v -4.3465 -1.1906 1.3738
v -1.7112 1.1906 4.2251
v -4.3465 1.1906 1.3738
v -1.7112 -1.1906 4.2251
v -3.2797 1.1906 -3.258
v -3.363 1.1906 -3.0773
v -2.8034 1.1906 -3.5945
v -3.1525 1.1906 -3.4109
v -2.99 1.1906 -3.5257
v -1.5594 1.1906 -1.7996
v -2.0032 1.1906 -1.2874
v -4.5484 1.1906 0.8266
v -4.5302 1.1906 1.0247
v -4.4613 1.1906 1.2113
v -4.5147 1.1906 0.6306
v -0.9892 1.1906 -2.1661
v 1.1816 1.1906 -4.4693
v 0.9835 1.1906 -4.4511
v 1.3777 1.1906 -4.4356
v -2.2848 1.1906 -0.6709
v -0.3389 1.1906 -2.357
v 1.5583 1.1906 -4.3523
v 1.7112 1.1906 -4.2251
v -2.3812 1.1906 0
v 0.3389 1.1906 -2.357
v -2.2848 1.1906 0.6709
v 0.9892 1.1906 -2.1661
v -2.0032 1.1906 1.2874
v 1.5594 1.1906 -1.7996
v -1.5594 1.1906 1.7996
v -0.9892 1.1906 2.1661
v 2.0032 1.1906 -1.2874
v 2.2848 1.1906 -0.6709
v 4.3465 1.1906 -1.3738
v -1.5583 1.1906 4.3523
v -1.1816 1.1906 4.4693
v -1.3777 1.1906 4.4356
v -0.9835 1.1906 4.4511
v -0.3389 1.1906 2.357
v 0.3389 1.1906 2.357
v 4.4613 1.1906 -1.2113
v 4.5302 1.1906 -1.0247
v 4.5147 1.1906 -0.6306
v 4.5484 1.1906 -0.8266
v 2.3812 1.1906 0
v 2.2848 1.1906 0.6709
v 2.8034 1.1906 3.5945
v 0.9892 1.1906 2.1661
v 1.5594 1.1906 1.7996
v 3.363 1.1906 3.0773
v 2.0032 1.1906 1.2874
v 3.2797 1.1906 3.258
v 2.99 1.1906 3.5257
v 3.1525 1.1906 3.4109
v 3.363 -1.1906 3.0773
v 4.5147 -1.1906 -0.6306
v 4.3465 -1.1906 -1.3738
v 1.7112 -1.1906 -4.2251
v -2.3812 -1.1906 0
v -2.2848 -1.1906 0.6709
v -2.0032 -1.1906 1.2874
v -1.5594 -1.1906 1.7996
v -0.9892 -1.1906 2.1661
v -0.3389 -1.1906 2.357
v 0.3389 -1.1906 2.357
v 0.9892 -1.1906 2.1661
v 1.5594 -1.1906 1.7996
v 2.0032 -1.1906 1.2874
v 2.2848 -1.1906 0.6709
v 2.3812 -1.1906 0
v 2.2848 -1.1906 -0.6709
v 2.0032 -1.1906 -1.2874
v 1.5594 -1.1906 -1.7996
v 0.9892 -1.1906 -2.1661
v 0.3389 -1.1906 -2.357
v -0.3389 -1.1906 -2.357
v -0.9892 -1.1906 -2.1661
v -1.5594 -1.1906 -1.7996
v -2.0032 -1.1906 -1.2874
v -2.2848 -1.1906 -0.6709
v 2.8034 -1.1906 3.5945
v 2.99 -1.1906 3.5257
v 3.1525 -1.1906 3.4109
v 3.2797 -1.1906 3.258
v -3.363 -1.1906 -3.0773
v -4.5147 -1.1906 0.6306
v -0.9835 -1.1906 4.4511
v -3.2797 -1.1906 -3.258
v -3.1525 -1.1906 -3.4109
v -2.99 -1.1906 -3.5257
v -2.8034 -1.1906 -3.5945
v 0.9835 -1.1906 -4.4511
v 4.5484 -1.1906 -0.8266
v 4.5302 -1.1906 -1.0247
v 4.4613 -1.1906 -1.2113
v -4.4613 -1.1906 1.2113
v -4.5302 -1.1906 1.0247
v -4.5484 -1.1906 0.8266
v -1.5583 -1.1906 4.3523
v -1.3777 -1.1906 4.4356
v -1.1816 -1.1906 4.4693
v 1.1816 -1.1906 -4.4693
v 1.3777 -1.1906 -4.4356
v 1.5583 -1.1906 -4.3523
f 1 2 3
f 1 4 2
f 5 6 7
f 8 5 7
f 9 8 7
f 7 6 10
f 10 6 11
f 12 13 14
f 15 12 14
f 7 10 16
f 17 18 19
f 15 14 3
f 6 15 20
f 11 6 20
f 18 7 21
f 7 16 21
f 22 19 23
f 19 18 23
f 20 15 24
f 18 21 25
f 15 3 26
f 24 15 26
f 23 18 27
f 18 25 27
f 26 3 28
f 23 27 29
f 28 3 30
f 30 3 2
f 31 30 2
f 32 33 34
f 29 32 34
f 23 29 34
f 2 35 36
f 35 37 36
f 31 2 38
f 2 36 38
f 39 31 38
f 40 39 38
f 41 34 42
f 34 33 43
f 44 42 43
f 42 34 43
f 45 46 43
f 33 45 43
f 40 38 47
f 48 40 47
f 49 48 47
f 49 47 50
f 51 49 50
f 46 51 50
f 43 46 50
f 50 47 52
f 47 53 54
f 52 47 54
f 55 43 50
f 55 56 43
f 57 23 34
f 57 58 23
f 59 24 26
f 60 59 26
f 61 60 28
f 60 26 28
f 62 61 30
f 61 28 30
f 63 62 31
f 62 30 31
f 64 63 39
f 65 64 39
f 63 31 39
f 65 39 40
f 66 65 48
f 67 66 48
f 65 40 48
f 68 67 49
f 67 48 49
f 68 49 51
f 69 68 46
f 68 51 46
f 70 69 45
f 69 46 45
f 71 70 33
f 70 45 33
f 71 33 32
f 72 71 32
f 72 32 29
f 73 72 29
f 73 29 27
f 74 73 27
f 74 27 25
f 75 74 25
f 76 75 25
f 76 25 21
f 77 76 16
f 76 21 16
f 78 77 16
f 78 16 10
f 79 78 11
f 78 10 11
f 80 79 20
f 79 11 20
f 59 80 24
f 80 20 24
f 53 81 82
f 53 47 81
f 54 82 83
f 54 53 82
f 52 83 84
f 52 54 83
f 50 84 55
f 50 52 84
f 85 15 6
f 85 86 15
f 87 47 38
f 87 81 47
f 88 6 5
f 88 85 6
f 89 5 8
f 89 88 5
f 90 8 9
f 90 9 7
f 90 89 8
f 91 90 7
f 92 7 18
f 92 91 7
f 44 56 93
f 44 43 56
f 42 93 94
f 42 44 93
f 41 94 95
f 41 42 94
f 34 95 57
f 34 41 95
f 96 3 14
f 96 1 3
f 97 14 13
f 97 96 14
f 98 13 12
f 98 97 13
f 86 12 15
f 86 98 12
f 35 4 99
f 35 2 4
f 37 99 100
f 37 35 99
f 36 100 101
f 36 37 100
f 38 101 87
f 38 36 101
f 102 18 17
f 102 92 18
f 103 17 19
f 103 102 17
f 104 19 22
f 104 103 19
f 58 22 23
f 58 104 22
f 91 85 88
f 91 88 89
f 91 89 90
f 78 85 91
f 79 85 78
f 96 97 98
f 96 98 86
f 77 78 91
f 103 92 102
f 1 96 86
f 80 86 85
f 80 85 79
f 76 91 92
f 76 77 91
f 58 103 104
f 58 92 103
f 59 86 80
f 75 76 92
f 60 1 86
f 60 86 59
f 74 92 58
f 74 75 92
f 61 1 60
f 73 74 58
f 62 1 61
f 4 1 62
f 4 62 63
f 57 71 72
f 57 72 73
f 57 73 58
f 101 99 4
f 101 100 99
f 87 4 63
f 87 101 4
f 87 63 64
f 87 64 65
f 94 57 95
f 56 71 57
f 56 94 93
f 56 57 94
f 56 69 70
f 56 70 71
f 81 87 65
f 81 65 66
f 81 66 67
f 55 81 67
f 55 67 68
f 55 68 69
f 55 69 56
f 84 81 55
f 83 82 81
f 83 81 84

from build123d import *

# Parameters (mm, degrees)
F1_DEPTH = 1.190625
F2_R     = 2.38125
F3_DEPTH = 2.38125
F4_R     = 0.762


with BuildPart() as f1:
    # F0 (on Front) → F1 (new body, symmetric)
    with BuildSketch(Plane.XZ):
        Polygon((-1.4126416008, 4.548169957), (-4.6451515239, 1.0507014657), (-3.2325099231, -3.4974684913), (1.4126416008, -4.548169957), (4.6451515239, -1.0507014657), (3.2325099231, 3.4974684913), align=None)
    extrude(amount=F1_DEPTH, both=True)

    # F2 (on face) → F3 (cut)
    with BuildSketch(Plane(origin=(0, 1.190625, 0), x_dir=(-1, 0, 0), z_dir=(0, 1, 0))):
        Circle(F2_R)
    extrude(amount=-F3_DEPTH, mode=Mode.SUBTRACT)

    # F4
    f4_edges = [f1.edges().sort_by_distance(p)[0] for p in [
        (-1.412642, 0, 4.54817),
        (3.23251, 0, 3.497468),
        (4.645152, 0, -1.050701),
        (1.412642, 0, -4.54817),
        (-3.23251, 0, -3.497468),
        (-4.645152, 0, 1.050701),
    ]]
    fillet(f4_edges, radius=F4_R)


solid = f1.part
